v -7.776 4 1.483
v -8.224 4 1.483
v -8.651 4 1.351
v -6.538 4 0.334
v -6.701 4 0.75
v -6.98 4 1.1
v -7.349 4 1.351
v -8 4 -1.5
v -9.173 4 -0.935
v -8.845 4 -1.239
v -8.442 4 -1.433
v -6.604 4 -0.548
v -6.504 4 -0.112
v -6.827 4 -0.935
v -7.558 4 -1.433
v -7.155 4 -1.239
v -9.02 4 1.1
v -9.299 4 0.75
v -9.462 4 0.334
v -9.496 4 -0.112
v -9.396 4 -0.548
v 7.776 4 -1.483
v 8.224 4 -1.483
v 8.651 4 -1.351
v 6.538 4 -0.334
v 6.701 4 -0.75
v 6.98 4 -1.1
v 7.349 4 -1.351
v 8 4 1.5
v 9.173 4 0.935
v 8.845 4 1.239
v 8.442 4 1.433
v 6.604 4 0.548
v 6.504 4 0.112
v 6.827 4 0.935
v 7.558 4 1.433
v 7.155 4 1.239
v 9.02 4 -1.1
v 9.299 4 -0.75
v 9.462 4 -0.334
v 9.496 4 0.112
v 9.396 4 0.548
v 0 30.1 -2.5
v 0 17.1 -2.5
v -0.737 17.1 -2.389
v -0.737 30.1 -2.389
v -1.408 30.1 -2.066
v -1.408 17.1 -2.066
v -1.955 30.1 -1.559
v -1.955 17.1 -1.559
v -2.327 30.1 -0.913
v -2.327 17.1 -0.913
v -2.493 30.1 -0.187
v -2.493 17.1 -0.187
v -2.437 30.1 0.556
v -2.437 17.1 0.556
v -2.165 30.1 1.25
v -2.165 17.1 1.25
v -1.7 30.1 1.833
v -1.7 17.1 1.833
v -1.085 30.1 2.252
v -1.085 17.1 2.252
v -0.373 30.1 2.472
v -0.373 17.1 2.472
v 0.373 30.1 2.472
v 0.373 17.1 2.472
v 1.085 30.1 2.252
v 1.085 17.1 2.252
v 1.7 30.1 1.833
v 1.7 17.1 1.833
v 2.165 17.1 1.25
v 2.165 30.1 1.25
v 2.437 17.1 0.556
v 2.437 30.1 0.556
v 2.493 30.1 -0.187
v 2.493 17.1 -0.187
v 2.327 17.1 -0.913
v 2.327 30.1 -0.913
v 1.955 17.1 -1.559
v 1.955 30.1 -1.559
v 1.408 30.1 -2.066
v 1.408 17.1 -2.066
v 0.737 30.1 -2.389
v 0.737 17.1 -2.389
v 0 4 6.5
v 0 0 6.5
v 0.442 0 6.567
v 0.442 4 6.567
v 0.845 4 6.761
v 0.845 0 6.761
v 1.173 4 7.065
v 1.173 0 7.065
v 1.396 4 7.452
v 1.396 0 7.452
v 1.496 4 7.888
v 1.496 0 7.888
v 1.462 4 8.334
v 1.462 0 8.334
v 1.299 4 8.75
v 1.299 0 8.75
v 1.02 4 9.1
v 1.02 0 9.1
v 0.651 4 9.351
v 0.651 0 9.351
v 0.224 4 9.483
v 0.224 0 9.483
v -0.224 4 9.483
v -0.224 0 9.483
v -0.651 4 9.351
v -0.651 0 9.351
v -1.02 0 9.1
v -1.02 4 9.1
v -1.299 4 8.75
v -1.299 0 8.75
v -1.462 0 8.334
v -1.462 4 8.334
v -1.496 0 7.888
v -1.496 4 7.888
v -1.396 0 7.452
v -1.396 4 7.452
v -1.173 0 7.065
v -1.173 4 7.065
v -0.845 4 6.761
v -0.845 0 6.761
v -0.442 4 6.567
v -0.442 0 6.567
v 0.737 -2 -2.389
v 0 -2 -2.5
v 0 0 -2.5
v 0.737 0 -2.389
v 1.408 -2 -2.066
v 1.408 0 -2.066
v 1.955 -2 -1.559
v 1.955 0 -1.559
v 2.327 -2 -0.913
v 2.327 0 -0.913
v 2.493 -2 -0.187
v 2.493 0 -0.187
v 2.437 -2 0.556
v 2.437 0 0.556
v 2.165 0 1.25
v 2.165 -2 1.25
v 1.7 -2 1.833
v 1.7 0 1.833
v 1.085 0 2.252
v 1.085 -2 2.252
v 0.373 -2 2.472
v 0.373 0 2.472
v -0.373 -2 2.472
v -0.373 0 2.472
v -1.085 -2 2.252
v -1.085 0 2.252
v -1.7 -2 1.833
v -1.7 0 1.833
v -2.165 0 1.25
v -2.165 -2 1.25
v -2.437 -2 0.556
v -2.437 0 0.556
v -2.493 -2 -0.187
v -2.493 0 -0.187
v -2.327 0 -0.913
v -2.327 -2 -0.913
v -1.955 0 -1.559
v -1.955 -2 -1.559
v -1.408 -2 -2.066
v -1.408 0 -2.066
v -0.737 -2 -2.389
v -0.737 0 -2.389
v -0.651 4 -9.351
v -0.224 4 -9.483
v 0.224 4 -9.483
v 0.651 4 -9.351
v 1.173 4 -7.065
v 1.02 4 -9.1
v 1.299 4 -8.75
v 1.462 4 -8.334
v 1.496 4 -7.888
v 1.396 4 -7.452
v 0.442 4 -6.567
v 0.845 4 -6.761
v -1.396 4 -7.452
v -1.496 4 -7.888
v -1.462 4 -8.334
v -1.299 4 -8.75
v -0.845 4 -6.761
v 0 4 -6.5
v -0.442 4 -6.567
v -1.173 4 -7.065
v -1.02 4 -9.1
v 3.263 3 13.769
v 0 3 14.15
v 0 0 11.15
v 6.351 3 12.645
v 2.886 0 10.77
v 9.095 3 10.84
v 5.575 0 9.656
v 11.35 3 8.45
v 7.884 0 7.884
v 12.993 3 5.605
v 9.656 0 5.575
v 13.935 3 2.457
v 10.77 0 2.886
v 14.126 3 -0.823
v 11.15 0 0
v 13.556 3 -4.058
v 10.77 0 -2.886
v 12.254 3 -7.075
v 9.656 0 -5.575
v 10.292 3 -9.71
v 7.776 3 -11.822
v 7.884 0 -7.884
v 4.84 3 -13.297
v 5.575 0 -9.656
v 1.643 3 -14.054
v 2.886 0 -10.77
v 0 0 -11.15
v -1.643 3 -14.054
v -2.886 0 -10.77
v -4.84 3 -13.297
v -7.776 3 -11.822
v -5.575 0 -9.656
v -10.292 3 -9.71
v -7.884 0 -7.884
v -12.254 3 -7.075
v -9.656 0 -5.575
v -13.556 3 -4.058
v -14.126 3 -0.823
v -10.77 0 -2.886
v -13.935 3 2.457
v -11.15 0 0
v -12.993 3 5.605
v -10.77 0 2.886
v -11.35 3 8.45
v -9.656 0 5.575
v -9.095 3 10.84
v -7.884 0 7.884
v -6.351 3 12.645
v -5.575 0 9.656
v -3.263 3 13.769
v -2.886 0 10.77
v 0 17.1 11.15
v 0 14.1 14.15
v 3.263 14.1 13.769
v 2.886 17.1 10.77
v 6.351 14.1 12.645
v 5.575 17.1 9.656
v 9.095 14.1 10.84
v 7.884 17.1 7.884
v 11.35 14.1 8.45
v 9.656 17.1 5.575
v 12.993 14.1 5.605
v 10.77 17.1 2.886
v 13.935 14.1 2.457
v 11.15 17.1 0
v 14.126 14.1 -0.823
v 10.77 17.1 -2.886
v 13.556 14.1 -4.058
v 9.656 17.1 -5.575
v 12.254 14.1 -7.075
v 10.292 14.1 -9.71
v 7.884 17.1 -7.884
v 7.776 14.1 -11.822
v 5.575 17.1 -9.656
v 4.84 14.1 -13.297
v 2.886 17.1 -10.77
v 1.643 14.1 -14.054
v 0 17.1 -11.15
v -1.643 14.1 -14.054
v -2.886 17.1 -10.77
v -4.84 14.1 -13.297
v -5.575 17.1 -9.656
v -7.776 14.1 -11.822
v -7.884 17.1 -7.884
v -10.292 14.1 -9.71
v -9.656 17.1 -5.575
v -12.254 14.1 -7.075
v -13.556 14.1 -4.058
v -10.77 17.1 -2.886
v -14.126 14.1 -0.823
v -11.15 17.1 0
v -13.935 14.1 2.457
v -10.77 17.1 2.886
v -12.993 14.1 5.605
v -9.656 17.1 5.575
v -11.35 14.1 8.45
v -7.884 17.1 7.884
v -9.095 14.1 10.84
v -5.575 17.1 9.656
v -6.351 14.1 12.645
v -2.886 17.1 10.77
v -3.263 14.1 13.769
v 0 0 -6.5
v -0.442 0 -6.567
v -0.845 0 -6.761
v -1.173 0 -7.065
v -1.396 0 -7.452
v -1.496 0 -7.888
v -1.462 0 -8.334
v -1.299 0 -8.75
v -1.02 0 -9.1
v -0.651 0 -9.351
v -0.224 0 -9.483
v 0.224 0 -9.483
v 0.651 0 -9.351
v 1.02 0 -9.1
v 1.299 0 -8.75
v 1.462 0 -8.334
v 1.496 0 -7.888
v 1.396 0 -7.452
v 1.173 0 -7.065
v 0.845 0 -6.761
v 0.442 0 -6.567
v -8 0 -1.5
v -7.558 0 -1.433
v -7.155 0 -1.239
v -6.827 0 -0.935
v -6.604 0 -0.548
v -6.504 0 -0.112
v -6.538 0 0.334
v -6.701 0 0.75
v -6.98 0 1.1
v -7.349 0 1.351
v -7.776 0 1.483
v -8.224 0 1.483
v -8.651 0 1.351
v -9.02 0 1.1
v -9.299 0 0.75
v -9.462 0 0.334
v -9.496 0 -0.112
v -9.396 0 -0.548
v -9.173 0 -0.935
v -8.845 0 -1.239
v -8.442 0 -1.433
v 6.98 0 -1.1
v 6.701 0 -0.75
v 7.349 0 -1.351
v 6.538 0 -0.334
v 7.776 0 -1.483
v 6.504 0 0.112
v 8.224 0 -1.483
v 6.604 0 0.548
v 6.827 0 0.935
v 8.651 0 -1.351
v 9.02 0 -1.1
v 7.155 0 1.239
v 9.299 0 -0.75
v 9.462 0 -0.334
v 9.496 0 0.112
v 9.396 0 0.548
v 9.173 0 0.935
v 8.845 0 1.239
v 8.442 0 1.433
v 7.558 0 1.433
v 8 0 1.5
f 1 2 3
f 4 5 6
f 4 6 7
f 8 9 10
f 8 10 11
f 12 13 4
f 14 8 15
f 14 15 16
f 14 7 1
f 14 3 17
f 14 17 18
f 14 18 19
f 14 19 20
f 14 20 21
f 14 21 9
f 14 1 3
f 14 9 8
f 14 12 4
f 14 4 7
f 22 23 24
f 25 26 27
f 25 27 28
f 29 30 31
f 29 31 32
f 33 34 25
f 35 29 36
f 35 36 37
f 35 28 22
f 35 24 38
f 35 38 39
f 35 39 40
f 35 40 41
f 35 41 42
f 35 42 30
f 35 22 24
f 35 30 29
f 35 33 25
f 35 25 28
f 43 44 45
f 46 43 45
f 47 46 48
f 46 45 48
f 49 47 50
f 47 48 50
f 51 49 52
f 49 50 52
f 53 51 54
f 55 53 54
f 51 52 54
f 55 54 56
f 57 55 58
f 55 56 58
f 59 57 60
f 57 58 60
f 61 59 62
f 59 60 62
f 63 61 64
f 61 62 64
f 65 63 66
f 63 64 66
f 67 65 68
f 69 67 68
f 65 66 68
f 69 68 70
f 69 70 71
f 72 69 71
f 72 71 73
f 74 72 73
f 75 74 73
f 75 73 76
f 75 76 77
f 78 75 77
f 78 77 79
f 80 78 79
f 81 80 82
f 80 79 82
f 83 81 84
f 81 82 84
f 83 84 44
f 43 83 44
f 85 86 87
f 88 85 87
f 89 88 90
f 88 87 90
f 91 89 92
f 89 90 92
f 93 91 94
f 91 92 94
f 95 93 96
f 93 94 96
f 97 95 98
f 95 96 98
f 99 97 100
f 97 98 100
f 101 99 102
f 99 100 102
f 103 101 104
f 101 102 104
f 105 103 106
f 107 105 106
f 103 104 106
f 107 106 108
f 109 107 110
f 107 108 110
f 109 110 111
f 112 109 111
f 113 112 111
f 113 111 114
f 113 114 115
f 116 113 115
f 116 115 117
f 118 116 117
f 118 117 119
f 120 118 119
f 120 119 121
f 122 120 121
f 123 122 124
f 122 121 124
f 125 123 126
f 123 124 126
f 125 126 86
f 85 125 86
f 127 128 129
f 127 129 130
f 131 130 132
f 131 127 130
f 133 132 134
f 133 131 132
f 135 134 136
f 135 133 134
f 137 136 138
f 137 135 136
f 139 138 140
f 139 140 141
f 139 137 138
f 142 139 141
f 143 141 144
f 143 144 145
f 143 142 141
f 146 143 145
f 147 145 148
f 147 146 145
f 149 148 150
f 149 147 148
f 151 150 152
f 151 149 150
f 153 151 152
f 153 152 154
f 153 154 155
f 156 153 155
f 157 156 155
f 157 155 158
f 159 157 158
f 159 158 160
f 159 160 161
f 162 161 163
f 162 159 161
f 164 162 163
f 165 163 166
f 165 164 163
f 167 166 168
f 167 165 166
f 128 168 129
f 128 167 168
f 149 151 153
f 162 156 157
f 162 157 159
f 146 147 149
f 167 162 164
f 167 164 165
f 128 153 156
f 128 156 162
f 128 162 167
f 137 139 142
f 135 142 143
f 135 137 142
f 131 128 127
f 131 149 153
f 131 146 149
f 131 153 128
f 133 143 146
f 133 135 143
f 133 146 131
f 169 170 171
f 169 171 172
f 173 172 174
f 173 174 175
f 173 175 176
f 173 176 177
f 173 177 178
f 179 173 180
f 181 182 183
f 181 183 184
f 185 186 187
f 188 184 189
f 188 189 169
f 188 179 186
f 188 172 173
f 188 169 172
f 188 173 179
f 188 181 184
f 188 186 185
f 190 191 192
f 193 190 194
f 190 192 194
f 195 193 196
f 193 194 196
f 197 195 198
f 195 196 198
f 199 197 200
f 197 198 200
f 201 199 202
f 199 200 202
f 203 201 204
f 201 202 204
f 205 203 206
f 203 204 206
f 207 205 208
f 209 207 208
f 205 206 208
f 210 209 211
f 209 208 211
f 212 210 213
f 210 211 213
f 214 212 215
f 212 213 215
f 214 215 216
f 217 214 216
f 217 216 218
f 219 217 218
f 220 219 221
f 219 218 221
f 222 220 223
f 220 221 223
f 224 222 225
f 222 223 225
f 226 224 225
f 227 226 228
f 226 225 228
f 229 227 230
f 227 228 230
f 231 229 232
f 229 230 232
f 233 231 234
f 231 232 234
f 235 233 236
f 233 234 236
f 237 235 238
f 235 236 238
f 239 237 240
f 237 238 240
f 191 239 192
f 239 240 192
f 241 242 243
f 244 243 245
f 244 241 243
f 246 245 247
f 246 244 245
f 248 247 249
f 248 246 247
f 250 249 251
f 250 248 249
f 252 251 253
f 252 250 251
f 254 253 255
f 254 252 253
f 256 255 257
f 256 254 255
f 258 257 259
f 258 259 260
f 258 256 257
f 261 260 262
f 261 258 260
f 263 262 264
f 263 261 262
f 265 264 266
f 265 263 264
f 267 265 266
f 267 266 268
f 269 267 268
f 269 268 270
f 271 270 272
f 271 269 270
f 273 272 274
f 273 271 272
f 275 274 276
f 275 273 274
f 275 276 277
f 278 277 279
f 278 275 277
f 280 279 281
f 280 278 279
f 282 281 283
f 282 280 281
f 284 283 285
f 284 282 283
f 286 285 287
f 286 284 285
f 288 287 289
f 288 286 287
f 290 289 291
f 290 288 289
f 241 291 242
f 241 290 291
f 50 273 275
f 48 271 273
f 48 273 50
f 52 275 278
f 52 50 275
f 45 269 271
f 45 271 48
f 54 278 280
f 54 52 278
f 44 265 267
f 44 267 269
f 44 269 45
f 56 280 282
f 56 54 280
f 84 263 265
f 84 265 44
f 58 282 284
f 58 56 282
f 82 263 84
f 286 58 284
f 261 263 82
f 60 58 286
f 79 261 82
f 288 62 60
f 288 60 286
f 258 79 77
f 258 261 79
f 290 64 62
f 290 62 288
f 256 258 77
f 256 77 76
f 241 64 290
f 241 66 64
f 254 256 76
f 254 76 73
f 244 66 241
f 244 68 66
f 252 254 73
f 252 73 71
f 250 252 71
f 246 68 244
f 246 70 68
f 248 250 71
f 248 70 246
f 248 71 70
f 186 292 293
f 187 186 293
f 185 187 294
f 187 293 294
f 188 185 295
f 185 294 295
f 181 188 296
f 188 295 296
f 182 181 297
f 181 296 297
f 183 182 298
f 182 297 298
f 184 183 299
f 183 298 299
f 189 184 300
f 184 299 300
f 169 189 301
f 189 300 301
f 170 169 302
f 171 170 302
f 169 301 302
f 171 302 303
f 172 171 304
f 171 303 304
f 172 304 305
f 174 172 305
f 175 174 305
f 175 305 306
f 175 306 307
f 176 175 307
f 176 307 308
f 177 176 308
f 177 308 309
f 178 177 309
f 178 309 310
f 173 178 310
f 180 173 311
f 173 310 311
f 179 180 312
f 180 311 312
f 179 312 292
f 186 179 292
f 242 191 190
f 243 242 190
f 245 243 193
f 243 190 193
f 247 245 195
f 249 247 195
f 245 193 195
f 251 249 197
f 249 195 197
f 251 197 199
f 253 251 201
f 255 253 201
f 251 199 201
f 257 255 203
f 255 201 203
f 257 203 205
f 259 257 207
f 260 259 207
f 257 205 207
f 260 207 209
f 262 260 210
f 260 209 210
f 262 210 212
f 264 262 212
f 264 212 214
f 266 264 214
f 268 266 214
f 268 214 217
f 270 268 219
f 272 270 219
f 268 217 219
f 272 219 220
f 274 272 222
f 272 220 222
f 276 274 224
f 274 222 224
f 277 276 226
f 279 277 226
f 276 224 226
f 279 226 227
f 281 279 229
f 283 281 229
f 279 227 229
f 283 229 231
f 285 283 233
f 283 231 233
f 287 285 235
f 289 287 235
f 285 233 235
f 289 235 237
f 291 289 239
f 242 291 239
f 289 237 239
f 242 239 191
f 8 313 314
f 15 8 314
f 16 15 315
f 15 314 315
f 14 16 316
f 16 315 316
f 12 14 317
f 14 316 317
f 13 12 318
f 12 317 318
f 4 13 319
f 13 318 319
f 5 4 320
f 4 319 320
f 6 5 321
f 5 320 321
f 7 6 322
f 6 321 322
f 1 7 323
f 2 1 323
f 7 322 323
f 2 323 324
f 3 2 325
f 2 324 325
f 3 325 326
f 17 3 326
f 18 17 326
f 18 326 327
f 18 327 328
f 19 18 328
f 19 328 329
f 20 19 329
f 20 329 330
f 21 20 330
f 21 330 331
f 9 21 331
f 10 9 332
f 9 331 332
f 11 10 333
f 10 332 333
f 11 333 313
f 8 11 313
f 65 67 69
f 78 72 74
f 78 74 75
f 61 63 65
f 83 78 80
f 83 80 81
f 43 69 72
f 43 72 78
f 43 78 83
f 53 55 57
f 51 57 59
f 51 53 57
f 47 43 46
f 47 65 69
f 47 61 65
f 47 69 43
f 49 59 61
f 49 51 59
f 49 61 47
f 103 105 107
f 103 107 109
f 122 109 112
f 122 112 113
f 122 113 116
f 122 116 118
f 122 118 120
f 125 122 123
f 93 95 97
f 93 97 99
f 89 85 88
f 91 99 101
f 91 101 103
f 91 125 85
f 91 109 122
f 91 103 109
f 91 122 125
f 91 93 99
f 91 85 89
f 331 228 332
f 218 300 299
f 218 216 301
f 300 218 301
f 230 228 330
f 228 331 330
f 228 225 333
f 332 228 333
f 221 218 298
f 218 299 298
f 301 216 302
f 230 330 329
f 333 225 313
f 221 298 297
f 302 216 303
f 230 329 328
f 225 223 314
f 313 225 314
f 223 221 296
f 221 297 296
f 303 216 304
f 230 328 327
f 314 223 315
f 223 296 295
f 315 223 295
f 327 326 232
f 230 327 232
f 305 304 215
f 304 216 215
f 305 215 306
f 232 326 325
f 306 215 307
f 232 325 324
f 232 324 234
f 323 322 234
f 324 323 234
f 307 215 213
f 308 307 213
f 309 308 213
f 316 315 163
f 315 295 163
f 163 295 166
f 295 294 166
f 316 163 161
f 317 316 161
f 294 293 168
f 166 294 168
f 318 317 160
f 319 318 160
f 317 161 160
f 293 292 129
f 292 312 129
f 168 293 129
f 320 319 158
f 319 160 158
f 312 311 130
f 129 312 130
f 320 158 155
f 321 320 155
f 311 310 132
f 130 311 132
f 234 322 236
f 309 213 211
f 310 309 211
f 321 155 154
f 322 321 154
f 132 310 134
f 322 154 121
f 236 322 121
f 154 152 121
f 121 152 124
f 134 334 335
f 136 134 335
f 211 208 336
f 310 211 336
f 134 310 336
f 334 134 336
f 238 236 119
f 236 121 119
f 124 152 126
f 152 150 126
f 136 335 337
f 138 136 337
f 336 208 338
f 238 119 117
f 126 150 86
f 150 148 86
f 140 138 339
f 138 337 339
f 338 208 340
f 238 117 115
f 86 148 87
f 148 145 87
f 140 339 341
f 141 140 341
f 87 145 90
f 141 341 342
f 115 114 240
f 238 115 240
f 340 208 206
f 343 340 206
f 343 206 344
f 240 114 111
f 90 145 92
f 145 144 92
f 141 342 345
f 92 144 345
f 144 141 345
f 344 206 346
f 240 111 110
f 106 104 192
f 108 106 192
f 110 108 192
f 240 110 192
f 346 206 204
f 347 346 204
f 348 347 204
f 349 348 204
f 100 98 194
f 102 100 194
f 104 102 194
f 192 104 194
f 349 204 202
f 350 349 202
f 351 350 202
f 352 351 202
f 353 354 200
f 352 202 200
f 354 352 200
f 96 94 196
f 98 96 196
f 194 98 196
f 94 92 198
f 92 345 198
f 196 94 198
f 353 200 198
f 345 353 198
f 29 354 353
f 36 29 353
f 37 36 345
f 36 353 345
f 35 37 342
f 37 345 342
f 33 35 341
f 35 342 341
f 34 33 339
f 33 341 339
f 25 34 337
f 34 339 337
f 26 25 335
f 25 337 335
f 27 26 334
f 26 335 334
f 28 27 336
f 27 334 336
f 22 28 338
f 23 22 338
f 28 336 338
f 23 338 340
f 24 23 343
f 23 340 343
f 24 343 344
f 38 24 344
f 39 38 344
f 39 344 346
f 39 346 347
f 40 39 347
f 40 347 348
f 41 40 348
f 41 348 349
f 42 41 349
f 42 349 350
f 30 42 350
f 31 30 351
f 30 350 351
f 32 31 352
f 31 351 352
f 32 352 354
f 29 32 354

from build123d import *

# Parameters (mm, degrees)
SKETCH_1_R          = 14.15
EXTRUDE_1_DEPTH     = 17.1
SKETCH_2_R          = 2.5
EXTRUDE_2_DEPTH     = 13
CHAMFER_1_SIZE      = 3
SKETCH_3_R          = 1.5
CUT_EXTRUDE_1_DEPTH = 4
EXTRUDE_START       = 2
SKETCH_4_R          = 2.5
EXTRUDE_3_DEPTH     = 2


with BuildPart() as part:
    # 草图1 → 凸台-拉伸1 (new body)
    with BuildSketch(Plane(origin=(0, 0, 0), x_dir=(1, 0, 0), z_dir=(0, 1, 0))):
        with Locations(Location((0, 0, 0), (0, 0, 270))):
            Circle(SKETCH_1_R)
    extrude(amount=EXTRUDE_1_DEPTH)

    # 草图2 → 凸台-拉伸2 (add)
    with BuildSketch(Plane(origin=(0, 17.1, 0), x_dir=(1, 0, 0), z_dir=(0, 1, 0))):
        with Locations(Location((0, 0, 0), (0, 0, 90))):
            Circle(SKETCH_2_R)
    extrude(amount=EXTRUDE_2_DEPTH)

    # 倒角1
    chamfer_1_edges = [part.edges().sort_by_distance(p)[0] for p in [
        (0, 0, -14.15),
        (0, 17.1, -14.15),
    ]]
    chamfer(chamfer_1_edges, length=CHAMFER_1_SIZE)

    # 草图3 → 切除-拉伸1 (cut)
    with BuildSketch(Plane.XZ):
        with Locations(Location((-8, 0, 0), (0, 0, 270))):
            Circle(SKETCH_3_R)
        with Locations(Location((0, 8, 0), (0, 0, 270))):
            Circle(SKETCH_3_R)
        with Locations(Location((8, 0, 0), (0, 0, 90))):
            Circle(SKETCH_3_R)
        with Locations(Location((0, -8, 0), (0, 0, 90))):
            Circle(SKETCH_3_R)
    extrude(amount=-CUT_EXTRUDE_1_DEPTH, mode=Mode.SUBTRACT)

    # 草图4 → 凸台-拉伸3 (add)
    with BuildSketch(Plane.XZ.offset(EXTRUDE_START)):
        with Locations(Location((0, 0, 0), (0, 0, 270))):
            Circle(SKETCH_4_R)
    extrude(amount=-EXTRUDE_3_DEPTH)


solid = part.part
